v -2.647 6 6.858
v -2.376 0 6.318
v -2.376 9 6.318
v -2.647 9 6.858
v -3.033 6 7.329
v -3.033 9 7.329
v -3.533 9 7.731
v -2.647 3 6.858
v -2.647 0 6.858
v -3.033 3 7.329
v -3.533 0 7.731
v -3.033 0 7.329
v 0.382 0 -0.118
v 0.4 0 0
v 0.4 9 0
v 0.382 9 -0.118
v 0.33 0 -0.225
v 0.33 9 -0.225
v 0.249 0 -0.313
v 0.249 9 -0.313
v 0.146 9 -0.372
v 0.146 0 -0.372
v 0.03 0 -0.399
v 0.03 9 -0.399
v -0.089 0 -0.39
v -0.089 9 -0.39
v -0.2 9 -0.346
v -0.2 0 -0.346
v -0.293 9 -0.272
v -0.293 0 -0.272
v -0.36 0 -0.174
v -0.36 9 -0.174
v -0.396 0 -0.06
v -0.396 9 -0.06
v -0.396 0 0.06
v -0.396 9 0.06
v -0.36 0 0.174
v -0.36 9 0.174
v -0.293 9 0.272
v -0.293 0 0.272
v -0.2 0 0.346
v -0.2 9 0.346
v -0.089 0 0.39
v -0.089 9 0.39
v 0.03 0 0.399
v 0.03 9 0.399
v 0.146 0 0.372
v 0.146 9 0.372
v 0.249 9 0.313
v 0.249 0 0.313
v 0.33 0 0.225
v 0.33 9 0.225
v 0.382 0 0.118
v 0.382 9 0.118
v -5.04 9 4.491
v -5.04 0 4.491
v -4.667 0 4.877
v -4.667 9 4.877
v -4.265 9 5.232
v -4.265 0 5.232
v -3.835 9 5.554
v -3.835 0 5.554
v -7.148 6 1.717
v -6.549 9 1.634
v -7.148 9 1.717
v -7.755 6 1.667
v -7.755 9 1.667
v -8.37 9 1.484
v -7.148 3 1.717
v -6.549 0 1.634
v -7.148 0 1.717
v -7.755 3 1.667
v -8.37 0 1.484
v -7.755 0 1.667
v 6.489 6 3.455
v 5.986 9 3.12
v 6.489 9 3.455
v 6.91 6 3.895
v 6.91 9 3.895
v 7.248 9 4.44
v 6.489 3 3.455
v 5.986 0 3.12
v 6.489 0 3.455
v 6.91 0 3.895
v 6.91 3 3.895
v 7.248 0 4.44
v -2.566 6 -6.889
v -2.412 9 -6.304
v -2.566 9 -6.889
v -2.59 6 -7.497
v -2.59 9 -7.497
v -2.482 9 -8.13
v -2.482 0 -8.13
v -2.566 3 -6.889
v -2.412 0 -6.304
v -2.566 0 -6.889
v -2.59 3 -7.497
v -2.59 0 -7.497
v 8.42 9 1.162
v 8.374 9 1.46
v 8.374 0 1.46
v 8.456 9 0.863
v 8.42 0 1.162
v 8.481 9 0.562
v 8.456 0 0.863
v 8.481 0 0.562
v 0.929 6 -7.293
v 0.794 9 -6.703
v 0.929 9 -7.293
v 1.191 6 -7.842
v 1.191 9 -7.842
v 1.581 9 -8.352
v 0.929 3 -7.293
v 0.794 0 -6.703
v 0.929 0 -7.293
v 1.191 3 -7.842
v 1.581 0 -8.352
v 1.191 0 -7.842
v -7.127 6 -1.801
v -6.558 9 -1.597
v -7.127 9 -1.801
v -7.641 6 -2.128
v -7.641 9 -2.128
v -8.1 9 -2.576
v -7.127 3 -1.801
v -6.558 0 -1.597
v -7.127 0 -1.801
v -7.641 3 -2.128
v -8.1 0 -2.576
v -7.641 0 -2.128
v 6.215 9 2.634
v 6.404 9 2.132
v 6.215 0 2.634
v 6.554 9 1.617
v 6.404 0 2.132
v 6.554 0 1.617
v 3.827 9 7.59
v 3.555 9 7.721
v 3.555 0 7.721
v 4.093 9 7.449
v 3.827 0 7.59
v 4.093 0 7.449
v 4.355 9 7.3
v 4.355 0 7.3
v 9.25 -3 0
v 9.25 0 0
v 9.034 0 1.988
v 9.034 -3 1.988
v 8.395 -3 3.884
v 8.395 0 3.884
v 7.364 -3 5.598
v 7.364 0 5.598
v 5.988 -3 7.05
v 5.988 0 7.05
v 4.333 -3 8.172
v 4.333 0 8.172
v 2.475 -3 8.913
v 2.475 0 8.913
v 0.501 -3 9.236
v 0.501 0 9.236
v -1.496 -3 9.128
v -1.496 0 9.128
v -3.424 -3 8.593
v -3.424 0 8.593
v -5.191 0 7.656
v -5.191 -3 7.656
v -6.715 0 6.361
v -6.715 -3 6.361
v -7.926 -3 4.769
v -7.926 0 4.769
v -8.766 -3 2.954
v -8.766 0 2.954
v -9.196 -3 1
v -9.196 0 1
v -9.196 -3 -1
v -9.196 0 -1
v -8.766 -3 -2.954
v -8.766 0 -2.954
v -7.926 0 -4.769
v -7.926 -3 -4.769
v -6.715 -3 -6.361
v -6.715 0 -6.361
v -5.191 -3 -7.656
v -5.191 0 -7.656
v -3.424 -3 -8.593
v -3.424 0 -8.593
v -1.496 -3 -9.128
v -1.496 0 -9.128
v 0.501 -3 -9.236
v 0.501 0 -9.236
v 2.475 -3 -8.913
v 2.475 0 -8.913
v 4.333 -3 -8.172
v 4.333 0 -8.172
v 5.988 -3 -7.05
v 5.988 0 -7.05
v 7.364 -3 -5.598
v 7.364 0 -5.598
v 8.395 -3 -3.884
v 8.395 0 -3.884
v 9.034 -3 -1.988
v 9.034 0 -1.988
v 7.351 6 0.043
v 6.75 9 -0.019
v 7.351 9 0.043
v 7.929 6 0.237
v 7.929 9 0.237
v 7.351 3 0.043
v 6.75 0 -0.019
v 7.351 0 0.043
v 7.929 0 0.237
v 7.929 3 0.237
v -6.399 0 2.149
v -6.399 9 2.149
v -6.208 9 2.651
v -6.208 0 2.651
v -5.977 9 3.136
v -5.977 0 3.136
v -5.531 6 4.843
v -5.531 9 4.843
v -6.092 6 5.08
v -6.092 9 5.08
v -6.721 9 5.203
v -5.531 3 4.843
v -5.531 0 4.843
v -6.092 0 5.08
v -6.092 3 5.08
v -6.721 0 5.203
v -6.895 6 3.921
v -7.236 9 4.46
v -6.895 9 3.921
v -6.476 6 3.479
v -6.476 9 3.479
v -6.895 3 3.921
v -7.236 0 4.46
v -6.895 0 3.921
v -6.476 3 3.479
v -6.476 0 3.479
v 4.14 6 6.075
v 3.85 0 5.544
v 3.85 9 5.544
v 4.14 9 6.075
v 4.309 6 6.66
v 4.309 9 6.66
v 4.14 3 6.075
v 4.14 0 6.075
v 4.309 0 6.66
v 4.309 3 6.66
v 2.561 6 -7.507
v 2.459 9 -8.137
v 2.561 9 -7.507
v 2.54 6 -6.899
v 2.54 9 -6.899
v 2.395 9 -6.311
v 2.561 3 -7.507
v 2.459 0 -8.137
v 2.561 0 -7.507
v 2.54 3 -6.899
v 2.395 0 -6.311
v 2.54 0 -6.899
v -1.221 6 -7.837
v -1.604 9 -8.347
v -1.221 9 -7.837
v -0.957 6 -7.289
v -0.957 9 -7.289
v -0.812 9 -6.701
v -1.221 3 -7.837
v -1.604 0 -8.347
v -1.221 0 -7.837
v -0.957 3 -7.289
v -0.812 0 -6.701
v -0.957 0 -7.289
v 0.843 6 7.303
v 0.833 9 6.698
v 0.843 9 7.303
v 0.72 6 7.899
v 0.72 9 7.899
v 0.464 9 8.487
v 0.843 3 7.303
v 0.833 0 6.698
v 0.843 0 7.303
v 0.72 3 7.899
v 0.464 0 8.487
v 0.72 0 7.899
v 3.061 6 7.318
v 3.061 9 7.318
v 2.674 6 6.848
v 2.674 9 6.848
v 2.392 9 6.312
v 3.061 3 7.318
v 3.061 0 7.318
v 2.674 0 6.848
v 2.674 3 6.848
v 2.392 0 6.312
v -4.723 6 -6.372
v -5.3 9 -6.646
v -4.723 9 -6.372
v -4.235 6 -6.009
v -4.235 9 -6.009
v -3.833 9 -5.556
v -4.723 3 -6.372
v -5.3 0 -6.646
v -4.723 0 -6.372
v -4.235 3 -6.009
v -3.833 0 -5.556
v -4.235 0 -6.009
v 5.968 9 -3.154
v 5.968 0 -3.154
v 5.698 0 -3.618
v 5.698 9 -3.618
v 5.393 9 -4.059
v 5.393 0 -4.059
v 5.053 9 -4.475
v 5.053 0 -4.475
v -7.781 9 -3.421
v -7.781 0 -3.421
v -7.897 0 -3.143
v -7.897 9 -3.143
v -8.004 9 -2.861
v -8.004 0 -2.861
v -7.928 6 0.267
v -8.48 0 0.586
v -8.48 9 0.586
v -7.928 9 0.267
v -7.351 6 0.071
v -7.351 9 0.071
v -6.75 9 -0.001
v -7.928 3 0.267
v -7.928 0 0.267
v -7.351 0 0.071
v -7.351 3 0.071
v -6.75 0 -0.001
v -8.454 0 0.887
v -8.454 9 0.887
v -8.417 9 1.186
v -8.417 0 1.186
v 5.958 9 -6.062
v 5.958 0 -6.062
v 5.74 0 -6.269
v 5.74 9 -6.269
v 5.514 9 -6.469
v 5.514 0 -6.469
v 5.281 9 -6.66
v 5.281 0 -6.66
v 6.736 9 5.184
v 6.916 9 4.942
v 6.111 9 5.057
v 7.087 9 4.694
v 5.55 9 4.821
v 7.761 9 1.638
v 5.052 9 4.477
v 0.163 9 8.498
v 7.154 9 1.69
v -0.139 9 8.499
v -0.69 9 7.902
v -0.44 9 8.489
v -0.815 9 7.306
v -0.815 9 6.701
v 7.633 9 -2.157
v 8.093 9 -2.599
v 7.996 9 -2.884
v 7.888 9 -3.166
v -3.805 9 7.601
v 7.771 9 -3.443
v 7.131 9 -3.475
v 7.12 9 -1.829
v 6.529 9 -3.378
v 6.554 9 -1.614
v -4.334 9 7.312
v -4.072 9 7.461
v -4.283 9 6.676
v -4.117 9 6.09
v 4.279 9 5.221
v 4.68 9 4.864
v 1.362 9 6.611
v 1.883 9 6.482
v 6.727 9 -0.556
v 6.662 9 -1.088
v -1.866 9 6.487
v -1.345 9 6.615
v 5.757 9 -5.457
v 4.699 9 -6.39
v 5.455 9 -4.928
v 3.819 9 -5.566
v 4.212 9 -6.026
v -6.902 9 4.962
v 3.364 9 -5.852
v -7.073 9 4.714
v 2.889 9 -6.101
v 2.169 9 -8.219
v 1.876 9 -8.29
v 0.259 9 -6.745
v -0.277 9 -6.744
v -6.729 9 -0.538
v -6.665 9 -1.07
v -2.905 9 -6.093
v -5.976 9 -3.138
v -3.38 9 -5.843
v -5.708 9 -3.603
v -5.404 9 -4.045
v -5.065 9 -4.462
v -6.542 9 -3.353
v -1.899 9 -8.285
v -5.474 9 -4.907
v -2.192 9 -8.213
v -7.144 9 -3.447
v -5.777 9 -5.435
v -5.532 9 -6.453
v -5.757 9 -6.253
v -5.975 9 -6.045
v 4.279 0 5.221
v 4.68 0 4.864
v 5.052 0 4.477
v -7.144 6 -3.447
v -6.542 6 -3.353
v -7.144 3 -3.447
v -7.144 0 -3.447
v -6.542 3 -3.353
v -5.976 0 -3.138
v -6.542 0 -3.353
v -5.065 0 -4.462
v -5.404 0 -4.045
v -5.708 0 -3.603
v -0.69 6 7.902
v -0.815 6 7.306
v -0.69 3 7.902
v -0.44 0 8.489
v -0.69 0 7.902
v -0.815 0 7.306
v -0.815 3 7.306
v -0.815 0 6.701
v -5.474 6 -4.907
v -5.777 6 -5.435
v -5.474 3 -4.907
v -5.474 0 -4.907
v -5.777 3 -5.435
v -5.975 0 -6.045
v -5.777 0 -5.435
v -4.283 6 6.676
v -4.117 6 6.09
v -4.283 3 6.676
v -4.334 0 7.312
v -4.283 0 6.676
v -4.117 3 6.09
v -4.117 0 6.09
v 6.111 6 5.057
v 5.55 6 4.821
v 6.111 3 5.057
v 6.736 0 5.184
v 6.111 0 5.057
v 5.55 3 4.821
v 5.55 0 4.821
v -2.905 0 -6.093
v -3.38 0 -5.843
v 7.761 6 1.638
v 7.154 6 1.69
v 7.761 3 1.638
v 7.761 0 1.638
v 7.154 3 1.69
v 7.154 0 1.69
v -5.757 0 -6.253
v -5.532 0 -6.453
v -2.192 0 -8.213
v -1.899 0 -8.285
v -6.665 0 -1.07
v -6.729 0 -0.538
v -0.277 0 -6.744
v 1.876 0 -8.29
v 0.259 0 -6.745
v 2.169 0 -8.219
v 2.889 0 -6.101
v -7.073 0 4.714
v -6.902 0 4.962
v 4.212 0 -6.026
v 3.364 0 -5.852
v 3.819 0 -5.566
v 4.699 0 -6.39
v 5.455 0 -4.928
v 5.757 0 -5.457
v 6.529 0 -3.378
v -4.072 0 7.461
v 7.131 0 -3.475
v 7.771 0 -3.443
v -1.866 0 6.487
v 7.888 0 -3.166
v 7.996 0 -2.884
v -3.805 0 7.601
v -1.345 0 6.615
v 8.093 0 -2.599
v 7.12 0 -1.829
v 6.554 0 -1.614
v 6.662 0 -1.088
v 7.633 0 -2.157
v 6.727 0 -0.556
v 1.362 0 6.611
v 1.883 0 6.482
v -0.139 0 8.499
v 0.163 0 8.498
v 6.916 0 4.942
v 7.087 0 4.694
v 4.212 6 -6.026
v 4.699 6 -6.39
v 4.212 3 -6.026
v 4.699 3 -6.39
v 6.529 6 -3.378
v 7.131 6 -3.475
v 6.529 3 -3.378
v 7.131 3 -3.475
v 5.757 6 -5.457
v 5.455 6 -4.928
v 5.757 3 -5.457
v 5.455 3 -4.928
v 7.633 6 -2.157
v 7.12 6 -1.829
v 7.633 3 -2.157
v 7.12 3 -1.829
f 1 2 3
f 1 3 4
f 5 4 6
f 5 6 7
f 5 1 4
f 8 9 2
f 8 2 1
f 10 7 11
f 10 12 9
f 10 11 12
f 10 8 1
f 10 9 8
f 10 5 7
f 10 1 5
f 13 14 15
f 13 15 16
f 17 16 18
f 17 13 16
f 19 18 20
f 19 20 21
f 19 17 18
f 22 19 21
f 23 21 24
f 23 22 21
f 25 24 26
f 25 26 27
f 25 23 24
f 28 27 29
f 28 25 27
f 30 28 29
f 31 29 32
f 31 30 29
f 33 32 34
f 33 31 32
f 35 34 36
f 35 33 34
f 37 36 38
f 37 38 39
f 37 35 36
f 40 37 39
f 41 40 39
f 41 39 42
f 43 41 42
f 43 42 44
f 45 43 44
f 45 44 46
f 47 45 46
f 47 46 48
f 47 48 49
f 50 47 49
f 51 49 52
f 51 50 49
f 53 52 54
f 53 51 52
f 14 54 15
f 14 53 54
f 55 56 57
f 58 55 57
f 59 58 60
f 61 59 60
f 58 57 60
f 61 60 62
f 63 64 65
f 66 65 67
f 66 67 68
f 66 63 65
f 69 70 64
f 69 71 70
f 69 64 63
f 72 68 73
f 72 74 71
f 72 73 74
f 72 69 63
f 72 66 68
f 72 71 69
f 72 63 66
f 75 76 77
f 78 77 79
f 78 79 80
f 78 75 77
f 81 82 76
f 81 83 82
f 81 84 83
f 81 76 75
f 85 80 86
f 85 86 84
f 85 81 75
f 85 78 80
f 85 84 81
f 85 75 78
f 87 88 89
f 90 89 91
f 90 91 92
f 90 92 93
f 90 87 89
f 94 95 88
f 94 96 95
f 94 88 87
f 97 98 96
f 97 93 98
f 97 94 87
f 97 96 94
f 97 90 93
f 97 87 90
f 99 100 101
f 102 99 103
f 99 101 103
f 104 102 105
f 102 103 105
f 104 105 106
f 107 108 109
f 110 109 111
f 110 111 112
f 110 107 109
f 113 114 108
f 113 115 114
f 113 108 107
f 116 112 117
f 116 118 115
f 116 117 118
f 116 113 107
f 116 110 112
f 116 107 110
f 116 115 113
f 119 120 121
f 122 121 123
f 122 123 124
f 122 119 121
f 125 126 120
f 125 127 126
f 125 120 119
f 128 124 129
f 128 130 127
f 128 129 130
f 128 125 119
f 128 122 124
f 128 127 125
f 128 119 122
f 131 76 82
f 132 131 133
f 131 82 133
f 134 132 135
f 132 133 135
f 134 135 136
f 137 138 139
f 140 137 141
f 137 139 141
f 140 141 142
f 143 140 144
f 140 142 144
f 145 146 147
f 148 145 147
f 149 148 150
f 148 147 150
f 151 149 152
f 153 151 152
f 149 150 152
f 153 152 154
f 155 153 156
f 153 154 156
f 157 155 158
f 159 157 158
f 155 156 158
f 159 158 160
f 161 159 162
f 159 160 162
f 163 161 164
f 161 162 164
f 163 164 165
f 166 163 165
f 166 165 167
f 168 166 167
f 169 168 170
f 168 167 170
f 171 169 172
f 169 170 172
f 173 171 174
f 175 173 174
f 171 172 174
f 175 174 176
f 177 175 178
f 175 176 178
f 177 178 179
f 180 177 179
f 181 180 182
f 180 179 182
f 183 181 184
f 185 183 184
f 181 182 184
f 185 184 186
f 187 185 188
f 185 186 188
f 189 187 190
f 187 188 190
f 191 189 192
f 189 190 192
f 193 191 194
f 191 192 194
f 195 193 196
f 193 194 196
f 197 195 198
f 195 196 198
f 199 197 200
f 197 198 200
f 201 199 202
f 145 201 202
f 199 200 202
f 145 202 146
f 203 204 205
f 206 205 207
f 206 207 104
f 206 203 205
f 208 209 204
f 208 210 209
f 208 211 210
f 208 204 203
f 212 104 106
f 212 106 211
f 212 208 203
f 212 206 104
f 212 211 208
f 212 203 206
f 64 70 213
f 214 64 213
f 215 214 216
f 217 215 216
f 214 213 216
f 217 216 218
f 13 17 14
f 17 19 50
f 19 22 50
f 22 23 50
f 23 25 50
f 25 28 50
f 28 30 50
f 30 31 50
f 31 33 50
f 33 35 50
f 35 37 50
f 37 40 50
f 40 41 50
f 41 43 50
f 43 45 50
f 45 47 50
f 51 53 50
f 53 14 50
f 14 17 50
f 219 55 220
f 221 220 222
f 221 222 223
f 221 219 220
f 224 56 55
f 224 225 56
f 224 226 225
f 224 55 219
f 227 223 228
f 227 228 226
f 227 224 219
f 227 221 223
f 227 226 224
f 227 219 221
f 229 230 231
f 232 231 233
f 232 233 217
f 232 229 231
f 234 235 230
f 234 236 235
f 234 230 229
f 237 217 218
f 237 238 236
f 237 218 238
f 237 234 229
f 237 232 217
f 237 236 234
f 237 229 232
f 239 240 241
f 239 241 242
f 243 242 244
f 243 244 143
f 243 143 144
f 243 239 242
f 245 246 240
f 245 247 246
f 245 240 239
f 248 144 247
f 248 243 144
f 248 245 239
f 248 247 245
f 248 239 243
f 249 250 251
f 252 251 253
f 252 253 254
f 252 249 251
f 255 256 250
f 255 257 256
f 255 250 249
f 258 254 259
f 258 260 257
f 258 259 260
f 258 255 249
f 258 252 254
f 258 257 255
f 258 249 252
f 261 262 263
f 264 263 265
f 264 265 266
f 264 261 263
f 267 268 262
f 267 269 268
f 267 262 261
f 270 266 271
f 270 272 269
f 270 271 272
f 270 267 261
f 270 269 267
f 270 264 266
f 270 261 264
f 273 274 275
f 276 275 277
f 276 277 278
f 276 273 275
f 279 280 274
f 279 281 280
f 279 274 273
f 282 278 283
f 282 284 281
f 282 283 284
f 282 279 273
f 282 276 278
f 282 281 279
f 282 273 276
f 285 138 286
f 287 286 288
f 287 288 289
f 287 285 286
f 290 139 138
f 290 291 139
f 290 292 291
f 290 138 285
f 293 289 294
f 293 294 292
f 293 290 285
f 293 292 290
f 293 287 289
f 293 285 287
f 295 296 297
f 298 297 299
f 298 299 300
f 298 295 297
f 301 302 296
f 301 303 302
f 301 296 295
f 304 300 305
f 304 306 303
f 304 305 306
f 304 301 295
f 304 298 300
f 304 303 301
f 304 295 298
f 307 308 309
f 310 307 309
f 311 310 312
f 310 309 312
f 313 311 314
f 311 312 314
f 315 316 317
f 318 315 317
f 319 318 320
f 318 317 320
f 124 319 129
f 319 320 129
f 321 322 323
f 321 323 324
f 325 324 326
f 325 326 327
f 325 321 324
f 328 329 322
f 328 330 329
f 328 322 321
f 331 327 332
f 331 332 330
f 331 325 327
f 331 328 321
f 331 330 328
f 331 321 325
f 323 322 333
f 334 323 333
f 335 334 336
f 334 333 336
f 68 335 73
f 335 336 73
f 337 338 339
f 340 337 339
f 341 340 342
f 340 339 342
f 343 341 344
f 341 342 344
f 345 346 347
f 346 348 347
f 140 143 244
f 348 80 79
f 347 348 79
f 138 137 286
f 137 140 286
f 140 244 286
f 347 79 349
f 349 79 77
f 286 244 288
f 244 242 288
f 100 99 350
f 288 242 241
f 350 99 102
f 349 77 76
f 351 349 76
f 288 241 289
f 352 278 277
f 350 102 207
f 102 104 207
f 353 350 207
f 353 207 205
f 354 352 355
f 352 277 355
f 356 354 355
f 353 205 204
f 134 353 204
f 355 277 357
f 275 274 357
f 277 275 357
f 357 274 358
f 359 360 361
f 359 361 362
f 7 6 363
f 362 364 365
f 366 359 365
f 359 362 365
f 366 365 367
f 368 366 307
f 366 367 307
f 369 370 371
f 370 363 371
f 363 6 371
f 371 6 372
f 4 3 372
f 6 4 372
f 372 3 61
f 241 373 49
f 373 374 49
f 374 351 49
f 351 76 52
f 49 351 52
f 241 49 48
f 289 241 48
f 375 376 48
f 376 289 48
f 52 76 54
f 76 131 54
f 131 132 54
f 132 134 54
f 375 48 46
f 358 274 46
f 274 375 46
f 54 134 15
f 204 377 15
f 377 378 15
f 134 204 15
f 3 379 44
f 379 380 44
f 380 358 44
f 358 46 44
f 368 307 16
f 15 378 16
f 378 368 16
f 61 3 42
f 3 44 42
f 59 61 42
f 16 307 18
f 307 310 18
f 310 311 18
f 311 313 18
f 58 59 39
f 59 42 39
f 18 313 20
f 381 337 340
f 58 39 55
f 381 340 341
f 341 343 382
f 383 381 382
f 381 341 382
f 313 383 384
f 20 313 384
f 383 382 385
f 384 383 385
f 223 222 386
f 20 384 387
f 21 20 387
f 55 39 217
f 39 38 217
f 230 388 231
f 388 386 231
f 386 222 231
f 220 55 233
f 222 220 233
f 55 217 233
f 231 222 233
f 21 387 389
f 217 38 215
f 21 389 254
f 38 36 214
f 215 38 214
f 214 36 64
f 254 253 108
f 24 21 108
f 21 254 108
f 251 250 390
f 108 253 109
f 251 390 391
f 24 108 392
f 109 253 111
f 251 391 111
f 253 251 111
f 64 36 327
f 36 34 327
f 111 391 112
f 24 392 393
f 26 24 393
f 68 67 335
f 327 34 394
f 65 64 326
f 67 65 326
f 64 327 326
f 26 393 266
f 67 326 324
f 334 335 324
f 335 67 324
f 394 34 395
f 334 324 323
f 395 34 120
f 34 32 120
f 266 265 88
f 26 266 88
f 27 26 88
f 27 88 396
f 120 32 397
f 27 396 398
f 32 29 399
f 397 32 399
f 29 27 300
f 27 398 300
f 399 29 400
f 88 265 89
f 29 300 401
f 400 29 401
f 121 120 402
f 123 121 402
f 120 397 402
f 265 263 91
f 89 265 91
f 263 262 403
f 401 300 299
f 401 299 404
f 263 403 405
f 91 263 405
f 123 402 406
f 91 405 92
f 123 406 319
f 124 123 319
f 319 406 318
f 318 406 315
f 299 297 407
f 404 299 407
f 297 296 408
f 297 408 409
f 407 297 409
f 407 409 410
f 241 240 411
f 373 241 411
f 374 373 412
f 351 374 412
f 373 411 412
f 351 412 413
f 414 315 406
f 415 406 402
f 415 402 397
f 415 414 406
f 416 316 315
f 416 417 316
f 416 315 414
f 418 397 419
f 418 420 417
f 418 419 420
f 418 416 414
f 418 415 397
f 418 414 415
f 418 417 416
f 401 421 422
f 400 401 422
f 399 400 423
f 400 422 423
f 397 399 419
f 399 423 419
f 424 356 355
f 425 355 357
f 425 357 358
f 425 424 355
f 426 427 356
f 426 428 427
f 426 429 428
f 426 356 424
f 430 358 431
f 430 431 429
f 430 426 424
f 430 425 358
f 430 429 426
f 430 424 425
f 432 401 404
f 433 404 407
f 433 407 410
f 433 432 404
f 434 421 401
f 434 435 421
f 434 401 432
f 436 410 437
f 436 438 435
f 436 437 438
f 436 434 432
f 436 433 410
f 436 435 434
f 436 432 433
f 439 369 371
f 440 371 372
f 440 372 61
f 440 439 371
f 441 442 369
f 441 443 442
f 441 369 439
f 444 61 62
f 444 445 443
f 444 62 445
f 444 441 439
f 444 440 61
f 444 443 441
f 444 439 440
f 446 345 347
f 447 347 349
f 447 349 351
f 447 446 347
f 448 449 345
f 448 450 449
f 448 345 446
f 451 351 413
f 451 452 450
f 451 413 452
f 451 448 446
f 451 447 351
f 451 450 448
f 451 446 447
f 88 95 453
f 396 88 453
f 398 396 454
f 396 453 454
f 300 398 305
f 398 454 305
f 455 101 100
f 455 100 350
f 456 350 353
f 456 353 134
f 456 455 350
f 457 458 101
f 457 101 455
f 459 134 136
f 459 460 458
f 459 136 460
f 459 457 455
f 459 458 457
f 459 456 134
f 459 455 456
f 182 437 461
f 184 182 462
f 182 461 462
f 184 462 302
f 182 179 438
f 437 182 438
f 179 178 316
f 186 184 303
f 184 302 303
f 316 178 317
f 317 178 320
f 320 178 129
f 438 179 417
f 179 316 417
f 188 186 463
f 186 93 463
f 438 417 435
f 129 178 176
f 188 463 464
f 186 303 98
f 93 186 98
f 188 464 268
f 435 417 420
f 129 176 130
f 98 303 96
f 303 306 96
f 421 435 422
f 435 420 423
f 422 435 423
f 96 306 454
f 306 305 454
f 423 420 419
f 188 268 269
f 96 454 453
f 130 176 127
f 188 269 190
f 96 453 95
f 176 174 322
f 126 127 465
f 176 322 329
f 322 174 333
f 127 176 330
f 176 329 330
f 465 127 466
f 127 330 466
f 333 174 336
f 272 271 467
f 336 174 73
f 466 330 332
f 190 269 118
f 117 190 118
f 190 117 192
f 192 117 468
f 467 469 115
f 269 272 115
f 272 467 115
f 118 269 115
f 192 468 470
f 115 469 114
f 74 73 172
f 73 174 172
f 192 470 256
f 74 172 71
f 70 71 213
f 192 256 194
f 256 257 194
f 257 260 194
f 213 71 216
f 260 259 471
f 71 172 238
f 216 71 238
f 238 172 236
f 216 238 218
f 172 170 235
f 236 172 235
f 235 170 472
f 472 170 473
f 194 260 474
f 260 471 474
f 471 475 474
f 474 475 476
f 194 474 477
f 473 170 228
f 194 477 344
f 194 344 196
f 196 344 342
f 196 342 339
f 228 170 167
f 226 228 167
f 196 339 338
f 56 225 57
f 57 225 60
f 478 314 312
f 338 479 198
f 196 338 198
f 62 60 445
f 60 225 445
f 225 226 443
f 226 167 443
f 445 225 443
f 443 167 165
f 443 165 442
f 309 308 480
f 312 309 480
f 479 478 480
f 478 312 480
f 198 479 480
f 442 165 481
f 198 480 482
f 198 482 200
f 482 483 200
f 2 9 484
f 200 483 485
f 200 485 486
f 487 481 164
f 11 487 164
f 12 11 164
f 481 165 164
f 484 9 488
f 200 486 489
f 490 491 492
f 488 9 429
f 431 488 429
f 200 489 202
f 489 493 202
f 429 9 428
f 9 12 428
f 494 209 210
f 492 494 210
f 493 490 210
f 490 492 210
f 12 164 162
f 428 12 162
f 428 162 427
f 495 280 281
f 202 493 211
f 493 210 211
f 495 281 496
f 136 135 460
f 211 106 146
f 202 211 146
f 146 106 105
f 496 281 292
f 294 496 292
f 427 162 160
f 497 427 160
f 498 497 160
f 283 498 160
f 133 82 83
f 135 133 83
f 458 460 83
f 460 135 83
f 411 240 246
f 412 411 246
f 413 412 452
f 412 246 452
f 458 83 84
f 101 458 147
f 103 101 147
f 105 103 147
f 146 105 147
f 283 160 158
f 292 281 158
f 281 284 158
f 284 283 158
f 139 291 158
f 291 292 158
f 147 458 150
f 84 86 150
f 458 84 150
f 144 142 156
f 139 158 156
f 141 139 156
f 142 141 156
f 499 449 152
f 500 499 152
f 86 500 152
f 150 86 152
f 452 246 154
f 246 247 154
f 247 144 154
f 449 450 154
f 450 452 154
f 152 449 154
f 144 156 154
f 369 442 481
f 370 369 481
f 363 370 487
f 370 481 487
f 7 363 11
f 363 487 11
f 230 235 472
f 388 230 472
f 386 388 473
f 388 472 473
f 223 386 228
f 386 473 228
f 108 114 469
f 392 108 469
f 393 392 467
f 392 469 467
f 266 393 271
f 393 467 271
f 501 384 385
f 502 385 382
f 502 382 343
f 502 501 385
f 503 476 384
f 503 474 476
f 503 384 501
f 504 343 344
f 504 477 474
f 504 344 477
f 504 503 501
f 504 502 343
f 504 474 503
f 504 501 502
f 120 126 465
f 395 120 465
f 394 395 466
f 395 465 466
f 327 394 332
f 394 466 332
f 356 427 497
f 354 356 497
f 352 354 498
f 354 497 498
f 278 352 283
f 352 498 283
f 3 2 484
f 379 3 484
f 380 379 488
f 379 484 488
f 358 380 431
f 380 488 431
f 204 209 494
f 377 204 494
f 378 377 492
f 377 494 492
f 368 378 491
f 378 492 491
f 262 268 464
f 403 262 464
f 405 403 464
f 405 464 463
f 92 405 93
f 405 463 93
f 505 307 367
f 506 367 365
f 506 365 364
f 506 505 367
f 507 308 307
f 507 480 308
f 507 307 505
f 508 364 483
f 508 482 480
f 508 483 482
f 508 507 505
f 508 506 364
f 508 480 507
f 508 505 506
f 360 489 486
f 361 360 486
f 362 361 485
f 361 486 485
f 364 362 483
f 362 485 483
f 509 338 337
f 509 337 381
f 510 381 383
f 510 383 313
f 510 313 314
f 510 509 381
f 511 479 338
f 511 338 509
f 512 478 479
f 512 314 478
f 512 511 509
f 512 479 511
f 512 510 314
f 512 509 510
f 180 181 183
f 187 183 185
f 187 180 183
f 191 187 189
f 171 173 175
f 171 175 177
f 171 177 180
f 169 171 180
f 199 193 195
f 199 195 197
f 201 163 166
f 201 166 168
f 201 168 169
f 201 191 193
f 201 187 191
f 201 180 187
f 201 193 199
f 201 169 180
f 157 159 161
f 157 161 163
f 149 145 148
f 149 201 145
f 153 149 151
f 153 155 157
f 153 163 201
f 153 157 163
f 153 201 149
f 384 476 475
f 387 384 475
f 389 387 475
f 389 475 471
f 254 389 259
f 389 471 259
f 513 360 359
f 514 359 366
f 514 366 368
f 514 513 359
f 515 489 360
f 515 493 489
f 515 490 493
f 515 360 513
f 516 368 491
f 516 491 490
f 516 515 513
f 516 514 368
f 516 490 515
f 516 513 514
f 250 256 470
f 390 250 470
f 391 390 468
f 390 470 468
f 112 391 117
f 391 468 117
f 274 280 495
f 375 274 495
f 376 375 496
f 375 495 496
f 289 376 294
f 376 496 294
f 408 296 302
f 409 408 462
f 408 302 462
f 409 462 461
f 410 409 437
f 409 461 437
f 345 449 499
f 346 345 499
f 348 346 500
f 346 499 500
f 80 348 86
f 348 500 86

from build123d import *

# Parameters (mm, degrees)
SKETCH1_R           = 0.4
BOSS_EXTRUDE1_DEPTH = 9
SKETCH2_R           = 9.25
BOSS_EXTRUDE2_DEPTH = 3


with BuildPart() as part:
    # Sketch1 → Boss-Extrude1 (new body)
    with BuildSketch(Plane(origin=(0, 0, 0), x_dir=(1, 0, 0), z_dir=(0, 1, 0))):
        with BuildLine():
            add(Edge.make_bspline(
                [(-5.065227978, 4.461610195), (-5.526615005, 4.86619147), (-5.830003112, 5.39406146), (-5.975392301, 6.045220165)],
                knots=[0, 0, 0, 0, 0.872429449, 0.872429449, 0.872429449, 0.872429449], degree=3))
            ThreePointArc((-5.065227978, 4.461610195), (-5.560258819, 3.827012132), (-5.976238464, 3.138004752))
            add(Edge.make_bspline(
                [(-7.780961116, 3.42149735), (-7.125870497, 3.507536778), (-6.52429628, 3.413039245), (-5.976238464, 3.138004752)],
                knots=[0.127683247, 0.127683247, 0.127683247, 0.127683247, 1, 1, 1, 1], degree=3))
            ThreePointArc((-7.780961116, 3.42149735), (-7.951879756, 3.00293329), (-8.10030101, 2.575873357))
            add(Edge.make_bspline(
                [(-6.558450277, 1.596630818), (-7.155006493, 1.740452504), (-7.668956737, 2.066866683), (-8.10030101, 2.575873357)],
                knots=[0, 0, 0, 0, 0.872429449, 0.872429449, 0.872429449, 0.872429449], degree=3))
            ThreePointArc((-6.558450277, 1.596630818), (-6.701865893, 0.804669837), (-6.749999881, 0.00126872))
            add(Edge.make_bspline(
                [(-8.479748007, -0.586407486), (-7.939678588, -0.205787566), (-7.363095879, -0.009895497), (-6.749999881, 0.00126872)],
                knots=[0.127683247, 0.127683247, 0.127683247, 0.127683247, 1, 1, 1, 1], degree=3))
            ThreePointArc((-8.479748007, -0.586407486), (-8.436572529, -1.036457408), (-8.369528376, -1.483574994))
            add(Edge.make_bspline(
                [(-6.549210655, -1.634117437), (-7.144272221, -1.784003157), (-7.751044795, -1.733822342), (-8.369528376, -1.483574994)],
                knots=[0, 0, 0, 0, 0.872429449, 0.872429449, 0.872429449, 0.872429449], degree=3))
            ThreePointArc((-6.549210655, -1.634117437), (-6.308156258, -2.402012621), (-5.977417671, -3.13575796))
            add(Edge.make_bspline(
                [(-7.235926822, -4.459973434), (-6.934601997, -3.871968458), (-6.515098947, -3.4305633), (-5.977417671, -3.13575796)],
                knots=[0.127683247, 0.127683247, 0.127683247, 0.127683247, 1, 1, 1, 1], degree=3))
            ThreePointArc((-7.235926822, -4.459973434), (-6.988548208, -4.838408204), (-6.721397655, -5.203154193))
            add(Edge.make_bspline(
                [(-5.039625799, -4.490509081), (-5.496871281, -4.899765193), (-6.0574619, -5.137313564), (-6.721397655, -5.203154193)],
                knots=[0, 0, 0, 0, 0.872429449, 0.872429449, 0.872429449, 0.872429449], degree=3))
            ThreePointArc((-5.039625799, -4.490509081), (-4.469324045, -5.058422935), (-3.835481109, -5.554420281))
            add(Edge.make_bspline(
                [(-4.334442004, -7.311813216), (-4.34089166, -6.651128039), (-4.174571361, -6.065330394), (-3.835481109, -5.554420281)],
                knots=[0.127683247, 0.127683247, 0.127683247, 0.127683247, 1, 1, 1, 1], degree=3))
            ThreePointArc((-4.334442004, -7.311813216), (-3.939531713, -7.53193799), (-3.533475733, -7.730753472))
            add(Edge.make_bspline(
                [(-2.375523406, -6.318179211), (-2.590203375, -6.893050073), (-2.976187484, -7.36390816), (-3.533475733, -7.730753472)],
                knots=[0, 0, 0, 0, 0.872429449, 0.872429449, 0.872429449, 0.872429449], degree=3))
            ThreePointArc((-2.375523406, -6.318179211), (-1.606623554, -6.556009515), (-0.814882047, -6.700631854))
            add(Edge.make_bspline(
                [(-0.439988759, -8.488604708), (-0.752735357, -7.906594341), (-0.877699786, -7.31060339), (-0.814882047, -6.700631854)],
                knots=[0.127683247, 0.127683247, 0.127683247, 0.127683247, 1, 1, 1, 1], degree=3))
            ThreePointArc((-0.439988759, -8.488604708), (0.011984021, -8.499991552), (0.463922896, -8.487330296))
            add(Edge.make_bspline(
                [(0.832782771, -6.698430626), (0.909848909, -7.307220251), (0.786895617, -7.903520141), (0.463922896, -8.487330296)],
                knots=[0, 0, 0, 0, 0.872429449, 0.872429449, 0.872429449, 0.872429449], degree=3))
            ThreePointArc((0.832782771, -6.698430626), (1.624135031, -6.551693323), (2.392396671, -6.311809421))
            add(Edge.make_bspline(
                [(3.555260608, -7.72075916), (3.007863545, -7.350755165), (2.620242233, -6.881105252), (2.392396671, -6.311809421)],
                knots=[0.127683247, 0.127683247, 0.127683247, 0.127683247, 1, 1, 1, 1], degree=3))
            ThreePointArc((3.555260608, -7.72075916), (3.96075436, -7.520799485), (4.355042381, -7.299562032))
            add(Edge.make_bspline(
                [(3.850308451, -5.54415231), (4.201465773, -6.047394331), (4.369710416, -6.632530905), (4.355042381, -7.299562032)],
                knots=[0, 0, 0, 0, 0.872429449, 0.872429449, 0.872429449, 0.872429449], degree=3))
            ThreePointArc((3.850308451, -5.54415231), (4.482823853, -5.046463148), (5.051606144, -4.477027515))
            add(Edge.make_bspline(
                [(6.736042616, -5.184180734), (6.079397157, -5.110946566), (5.517918333, -4.875228826), (5.051606144, -4.477027515)],
                knots=[0.127683247, 0.127683247, 0.127683247, 0.127683247, 1, 1, 1, 1], degree=3))
            ThreePointArc((6.736042616, -5.184180734), (7.002163607, -4.818682892), (7.24847414, -4.439552076))
            add(Edge.make_bspline(
                [(5.985774866, -3.119775513), (6.530577461, -3.402183249), (6.951477219, -3.84210877), (7.24847414, -4.439552076)],
                knots=[0, 0, 0, 0, 0.872429449, 0.872429449, 0.872429449, 0.872429449], degree=3))
            ThreePointArc((5.985774866, -3.119775513), (6.314551754, -2.385149082), (6.553553527, -1.616612559))
            add(Edge.make_bspline(
                [(8.373678438, -1.459968977), (7.758214146, -1.700281702), (7.151505842, -1.75249623), (6.553553527, -1.616612559)],
                knots=[0.127683247, 0.127683247, 0.127683247, 0.127683247, 1, 1, 1, 1], degree=3))
            ThreePointArc((8.373678438, -1.459968977), (8.439461558, -1.01266412), (8.481367828, -0.562494242))
            add(Edge.make_bspline(
                [(6.749972396, 0.019304256), (7.363612555, 0.022427015), (7.940744366, -0.171505818), (8.481367828, -0.562494242)],
                knots=[0, 0, 0, 0, 0.872429449, 0.872429449, 0.872429449, 0.872429449], degree=3))
            ThreePointArc((6.749972396, 0.019304256), (6.699691947, 0.822573894), (6.554160776, 1.614148852))
            add(Edge.make_bspline(
                [(8.093005444, 2.598704077), (7.65971777, 2.099897208), (7.146769547, 1.771712133), (6.554160776, 1.614148852)],
                knots=[0.127683247, 0.127683247, 0.127683247, 0.127683247, 1, 1, 1, 1], degree=3))
            ThreePointArc((8.093005444, 2.598704077), (7.943380571, 3.025343799), (7.771282357, 3.443424244))
            add(Edge.make_bspline(
                [(5.967832596, 3.153961653), (6.509732754, 3.44189952), (7.110882674, 3.53838705), (7.771282357, 3.443424244)],
                knots=[0, 0, 0, 0, 0.872429449, 0.872429449, 0.872429449, 0.872429449], degree=3))
            ThreePointArc((5.967832596, 3.153961653), (5.550013455, 3.841855105), (5.053288778, 4.475128213))
            add(Edge.make_bspline(
                [(5.958322434, 6.062045345), (5.806472362, 5.419014975), (5.504794477, 4.890042598), (5.053288778, 4.475128213)],
                knots=[0.127683247, 0.127683247, 0.127683247, 0.127683247, 1, 1, 1, 1], degree=3))
            ThreePointArc((5.958322434, 6.062045345), (5.627566824, 6.370281912), (5.280889753, 6.660495734))
            add(Edge.make_bspline(
                [(3.818534268, 5.566084444), (4.16455163, 6.072874324), (4.652003458, 6.437678087), (5.280889753, 6.660495734)],
                knots=[0, 0, 0, 0, 0.872429449, 0.872429449, 0.872429449, 0.872429449], degree=3))
            ThreePointArc((3.818534268, 5.566084444), (3.128893766, 5.98101361), (2.394769219, 6.310909632))
            add(Edge.make_bspline(
                [(2.45865956, 8.136645081), (2.623034112, 7.496701718), (2.601737332, 6.888123235), (2.394769219, 6.310909632)],
                knots=[0.127683247, 0.127683247, 0.127683247, 0.127683247, 1, 1, 1, 1], degree=3))
            ThreePointArc((2.45865956, 8.136645081), (2.022545337, 8.25586521), (1.580708948, 8.351727918))
            add(Edge.make_bspline(
                [(0.794455758, 6.703084368), (0.865321915, 7.312626807), (1.127406312, 7.862174657), (1.580708948, 8.351727918)],
                knots=[0, 0, 0, 0, 0.872429449, 0.872429449, 0.872429449, 0.872429449], degree=3))
            ThreePointArc((0.794455758, 6.703084368), (-0.009017778, 6.749993976), (-0.812363108, 6.700937709))
            add(Edge.make_bspline(
                [(-1.604252589, 8.347237485), (-1.161309642, 7.856984441), (-0.897346481, 7.308217849), (-0.812363108, 6.700937709)],
                knots=[0.127683247, 0.127683247, 0.127683247, 0.127683247, 1, 1, 1, 1], degree=3))
            ThreePointArc((-1.604252589, 8.347237485), (-2.045816912, 8.250129282), (-2.481593228, 8.129679886))
            add(Edge.make_bspline(
                [(-2.411622992, 6.304488444), (-2.632142622, 6.877144615), (-2.655466033, 7.485541762), (-2.481593228, 8.129679886)],
                knots=[0, 0, 0, 0, 0.872429449, 0.872429449, 0.872429449, 0.872429449], degree=3))
            ThreePointArc((-2.411622992, 6.304488444), (-3.144863458, 5.972632069), (-3.833392837, 5.555861712))
            add(Edge.make_bspline(
                [(-5.299649804, 6.645578377), (-4.679611352, 6.417326717), (-4.19085903, 6.054087828), (-3.833392837, 5.555861712)],
                knots=[0.127683247, 0.127683247, 0.127683247, 0.127683247, 1, 1, 1, 1], degree=3))
            ThreePointArc((-5.299649804, 6.645578377), (-5.645507162, 6.35438816), (-5.975392301, 6.045220165))
        make_face()
        Circle(SKETCH1_R, mode=Mode.SUBTRACT)
    extrude(amount=BOSS_EXTRUDE1_DEPTH)

    # Sketch2 → Boss-Extrude2 (add)
    with BuildSketch(Plane.XZ):
        Circle(SKETCH2_R)
    extrude(amount=BOSS_EXTRUDE2_DEPTH)


solid = part.part
